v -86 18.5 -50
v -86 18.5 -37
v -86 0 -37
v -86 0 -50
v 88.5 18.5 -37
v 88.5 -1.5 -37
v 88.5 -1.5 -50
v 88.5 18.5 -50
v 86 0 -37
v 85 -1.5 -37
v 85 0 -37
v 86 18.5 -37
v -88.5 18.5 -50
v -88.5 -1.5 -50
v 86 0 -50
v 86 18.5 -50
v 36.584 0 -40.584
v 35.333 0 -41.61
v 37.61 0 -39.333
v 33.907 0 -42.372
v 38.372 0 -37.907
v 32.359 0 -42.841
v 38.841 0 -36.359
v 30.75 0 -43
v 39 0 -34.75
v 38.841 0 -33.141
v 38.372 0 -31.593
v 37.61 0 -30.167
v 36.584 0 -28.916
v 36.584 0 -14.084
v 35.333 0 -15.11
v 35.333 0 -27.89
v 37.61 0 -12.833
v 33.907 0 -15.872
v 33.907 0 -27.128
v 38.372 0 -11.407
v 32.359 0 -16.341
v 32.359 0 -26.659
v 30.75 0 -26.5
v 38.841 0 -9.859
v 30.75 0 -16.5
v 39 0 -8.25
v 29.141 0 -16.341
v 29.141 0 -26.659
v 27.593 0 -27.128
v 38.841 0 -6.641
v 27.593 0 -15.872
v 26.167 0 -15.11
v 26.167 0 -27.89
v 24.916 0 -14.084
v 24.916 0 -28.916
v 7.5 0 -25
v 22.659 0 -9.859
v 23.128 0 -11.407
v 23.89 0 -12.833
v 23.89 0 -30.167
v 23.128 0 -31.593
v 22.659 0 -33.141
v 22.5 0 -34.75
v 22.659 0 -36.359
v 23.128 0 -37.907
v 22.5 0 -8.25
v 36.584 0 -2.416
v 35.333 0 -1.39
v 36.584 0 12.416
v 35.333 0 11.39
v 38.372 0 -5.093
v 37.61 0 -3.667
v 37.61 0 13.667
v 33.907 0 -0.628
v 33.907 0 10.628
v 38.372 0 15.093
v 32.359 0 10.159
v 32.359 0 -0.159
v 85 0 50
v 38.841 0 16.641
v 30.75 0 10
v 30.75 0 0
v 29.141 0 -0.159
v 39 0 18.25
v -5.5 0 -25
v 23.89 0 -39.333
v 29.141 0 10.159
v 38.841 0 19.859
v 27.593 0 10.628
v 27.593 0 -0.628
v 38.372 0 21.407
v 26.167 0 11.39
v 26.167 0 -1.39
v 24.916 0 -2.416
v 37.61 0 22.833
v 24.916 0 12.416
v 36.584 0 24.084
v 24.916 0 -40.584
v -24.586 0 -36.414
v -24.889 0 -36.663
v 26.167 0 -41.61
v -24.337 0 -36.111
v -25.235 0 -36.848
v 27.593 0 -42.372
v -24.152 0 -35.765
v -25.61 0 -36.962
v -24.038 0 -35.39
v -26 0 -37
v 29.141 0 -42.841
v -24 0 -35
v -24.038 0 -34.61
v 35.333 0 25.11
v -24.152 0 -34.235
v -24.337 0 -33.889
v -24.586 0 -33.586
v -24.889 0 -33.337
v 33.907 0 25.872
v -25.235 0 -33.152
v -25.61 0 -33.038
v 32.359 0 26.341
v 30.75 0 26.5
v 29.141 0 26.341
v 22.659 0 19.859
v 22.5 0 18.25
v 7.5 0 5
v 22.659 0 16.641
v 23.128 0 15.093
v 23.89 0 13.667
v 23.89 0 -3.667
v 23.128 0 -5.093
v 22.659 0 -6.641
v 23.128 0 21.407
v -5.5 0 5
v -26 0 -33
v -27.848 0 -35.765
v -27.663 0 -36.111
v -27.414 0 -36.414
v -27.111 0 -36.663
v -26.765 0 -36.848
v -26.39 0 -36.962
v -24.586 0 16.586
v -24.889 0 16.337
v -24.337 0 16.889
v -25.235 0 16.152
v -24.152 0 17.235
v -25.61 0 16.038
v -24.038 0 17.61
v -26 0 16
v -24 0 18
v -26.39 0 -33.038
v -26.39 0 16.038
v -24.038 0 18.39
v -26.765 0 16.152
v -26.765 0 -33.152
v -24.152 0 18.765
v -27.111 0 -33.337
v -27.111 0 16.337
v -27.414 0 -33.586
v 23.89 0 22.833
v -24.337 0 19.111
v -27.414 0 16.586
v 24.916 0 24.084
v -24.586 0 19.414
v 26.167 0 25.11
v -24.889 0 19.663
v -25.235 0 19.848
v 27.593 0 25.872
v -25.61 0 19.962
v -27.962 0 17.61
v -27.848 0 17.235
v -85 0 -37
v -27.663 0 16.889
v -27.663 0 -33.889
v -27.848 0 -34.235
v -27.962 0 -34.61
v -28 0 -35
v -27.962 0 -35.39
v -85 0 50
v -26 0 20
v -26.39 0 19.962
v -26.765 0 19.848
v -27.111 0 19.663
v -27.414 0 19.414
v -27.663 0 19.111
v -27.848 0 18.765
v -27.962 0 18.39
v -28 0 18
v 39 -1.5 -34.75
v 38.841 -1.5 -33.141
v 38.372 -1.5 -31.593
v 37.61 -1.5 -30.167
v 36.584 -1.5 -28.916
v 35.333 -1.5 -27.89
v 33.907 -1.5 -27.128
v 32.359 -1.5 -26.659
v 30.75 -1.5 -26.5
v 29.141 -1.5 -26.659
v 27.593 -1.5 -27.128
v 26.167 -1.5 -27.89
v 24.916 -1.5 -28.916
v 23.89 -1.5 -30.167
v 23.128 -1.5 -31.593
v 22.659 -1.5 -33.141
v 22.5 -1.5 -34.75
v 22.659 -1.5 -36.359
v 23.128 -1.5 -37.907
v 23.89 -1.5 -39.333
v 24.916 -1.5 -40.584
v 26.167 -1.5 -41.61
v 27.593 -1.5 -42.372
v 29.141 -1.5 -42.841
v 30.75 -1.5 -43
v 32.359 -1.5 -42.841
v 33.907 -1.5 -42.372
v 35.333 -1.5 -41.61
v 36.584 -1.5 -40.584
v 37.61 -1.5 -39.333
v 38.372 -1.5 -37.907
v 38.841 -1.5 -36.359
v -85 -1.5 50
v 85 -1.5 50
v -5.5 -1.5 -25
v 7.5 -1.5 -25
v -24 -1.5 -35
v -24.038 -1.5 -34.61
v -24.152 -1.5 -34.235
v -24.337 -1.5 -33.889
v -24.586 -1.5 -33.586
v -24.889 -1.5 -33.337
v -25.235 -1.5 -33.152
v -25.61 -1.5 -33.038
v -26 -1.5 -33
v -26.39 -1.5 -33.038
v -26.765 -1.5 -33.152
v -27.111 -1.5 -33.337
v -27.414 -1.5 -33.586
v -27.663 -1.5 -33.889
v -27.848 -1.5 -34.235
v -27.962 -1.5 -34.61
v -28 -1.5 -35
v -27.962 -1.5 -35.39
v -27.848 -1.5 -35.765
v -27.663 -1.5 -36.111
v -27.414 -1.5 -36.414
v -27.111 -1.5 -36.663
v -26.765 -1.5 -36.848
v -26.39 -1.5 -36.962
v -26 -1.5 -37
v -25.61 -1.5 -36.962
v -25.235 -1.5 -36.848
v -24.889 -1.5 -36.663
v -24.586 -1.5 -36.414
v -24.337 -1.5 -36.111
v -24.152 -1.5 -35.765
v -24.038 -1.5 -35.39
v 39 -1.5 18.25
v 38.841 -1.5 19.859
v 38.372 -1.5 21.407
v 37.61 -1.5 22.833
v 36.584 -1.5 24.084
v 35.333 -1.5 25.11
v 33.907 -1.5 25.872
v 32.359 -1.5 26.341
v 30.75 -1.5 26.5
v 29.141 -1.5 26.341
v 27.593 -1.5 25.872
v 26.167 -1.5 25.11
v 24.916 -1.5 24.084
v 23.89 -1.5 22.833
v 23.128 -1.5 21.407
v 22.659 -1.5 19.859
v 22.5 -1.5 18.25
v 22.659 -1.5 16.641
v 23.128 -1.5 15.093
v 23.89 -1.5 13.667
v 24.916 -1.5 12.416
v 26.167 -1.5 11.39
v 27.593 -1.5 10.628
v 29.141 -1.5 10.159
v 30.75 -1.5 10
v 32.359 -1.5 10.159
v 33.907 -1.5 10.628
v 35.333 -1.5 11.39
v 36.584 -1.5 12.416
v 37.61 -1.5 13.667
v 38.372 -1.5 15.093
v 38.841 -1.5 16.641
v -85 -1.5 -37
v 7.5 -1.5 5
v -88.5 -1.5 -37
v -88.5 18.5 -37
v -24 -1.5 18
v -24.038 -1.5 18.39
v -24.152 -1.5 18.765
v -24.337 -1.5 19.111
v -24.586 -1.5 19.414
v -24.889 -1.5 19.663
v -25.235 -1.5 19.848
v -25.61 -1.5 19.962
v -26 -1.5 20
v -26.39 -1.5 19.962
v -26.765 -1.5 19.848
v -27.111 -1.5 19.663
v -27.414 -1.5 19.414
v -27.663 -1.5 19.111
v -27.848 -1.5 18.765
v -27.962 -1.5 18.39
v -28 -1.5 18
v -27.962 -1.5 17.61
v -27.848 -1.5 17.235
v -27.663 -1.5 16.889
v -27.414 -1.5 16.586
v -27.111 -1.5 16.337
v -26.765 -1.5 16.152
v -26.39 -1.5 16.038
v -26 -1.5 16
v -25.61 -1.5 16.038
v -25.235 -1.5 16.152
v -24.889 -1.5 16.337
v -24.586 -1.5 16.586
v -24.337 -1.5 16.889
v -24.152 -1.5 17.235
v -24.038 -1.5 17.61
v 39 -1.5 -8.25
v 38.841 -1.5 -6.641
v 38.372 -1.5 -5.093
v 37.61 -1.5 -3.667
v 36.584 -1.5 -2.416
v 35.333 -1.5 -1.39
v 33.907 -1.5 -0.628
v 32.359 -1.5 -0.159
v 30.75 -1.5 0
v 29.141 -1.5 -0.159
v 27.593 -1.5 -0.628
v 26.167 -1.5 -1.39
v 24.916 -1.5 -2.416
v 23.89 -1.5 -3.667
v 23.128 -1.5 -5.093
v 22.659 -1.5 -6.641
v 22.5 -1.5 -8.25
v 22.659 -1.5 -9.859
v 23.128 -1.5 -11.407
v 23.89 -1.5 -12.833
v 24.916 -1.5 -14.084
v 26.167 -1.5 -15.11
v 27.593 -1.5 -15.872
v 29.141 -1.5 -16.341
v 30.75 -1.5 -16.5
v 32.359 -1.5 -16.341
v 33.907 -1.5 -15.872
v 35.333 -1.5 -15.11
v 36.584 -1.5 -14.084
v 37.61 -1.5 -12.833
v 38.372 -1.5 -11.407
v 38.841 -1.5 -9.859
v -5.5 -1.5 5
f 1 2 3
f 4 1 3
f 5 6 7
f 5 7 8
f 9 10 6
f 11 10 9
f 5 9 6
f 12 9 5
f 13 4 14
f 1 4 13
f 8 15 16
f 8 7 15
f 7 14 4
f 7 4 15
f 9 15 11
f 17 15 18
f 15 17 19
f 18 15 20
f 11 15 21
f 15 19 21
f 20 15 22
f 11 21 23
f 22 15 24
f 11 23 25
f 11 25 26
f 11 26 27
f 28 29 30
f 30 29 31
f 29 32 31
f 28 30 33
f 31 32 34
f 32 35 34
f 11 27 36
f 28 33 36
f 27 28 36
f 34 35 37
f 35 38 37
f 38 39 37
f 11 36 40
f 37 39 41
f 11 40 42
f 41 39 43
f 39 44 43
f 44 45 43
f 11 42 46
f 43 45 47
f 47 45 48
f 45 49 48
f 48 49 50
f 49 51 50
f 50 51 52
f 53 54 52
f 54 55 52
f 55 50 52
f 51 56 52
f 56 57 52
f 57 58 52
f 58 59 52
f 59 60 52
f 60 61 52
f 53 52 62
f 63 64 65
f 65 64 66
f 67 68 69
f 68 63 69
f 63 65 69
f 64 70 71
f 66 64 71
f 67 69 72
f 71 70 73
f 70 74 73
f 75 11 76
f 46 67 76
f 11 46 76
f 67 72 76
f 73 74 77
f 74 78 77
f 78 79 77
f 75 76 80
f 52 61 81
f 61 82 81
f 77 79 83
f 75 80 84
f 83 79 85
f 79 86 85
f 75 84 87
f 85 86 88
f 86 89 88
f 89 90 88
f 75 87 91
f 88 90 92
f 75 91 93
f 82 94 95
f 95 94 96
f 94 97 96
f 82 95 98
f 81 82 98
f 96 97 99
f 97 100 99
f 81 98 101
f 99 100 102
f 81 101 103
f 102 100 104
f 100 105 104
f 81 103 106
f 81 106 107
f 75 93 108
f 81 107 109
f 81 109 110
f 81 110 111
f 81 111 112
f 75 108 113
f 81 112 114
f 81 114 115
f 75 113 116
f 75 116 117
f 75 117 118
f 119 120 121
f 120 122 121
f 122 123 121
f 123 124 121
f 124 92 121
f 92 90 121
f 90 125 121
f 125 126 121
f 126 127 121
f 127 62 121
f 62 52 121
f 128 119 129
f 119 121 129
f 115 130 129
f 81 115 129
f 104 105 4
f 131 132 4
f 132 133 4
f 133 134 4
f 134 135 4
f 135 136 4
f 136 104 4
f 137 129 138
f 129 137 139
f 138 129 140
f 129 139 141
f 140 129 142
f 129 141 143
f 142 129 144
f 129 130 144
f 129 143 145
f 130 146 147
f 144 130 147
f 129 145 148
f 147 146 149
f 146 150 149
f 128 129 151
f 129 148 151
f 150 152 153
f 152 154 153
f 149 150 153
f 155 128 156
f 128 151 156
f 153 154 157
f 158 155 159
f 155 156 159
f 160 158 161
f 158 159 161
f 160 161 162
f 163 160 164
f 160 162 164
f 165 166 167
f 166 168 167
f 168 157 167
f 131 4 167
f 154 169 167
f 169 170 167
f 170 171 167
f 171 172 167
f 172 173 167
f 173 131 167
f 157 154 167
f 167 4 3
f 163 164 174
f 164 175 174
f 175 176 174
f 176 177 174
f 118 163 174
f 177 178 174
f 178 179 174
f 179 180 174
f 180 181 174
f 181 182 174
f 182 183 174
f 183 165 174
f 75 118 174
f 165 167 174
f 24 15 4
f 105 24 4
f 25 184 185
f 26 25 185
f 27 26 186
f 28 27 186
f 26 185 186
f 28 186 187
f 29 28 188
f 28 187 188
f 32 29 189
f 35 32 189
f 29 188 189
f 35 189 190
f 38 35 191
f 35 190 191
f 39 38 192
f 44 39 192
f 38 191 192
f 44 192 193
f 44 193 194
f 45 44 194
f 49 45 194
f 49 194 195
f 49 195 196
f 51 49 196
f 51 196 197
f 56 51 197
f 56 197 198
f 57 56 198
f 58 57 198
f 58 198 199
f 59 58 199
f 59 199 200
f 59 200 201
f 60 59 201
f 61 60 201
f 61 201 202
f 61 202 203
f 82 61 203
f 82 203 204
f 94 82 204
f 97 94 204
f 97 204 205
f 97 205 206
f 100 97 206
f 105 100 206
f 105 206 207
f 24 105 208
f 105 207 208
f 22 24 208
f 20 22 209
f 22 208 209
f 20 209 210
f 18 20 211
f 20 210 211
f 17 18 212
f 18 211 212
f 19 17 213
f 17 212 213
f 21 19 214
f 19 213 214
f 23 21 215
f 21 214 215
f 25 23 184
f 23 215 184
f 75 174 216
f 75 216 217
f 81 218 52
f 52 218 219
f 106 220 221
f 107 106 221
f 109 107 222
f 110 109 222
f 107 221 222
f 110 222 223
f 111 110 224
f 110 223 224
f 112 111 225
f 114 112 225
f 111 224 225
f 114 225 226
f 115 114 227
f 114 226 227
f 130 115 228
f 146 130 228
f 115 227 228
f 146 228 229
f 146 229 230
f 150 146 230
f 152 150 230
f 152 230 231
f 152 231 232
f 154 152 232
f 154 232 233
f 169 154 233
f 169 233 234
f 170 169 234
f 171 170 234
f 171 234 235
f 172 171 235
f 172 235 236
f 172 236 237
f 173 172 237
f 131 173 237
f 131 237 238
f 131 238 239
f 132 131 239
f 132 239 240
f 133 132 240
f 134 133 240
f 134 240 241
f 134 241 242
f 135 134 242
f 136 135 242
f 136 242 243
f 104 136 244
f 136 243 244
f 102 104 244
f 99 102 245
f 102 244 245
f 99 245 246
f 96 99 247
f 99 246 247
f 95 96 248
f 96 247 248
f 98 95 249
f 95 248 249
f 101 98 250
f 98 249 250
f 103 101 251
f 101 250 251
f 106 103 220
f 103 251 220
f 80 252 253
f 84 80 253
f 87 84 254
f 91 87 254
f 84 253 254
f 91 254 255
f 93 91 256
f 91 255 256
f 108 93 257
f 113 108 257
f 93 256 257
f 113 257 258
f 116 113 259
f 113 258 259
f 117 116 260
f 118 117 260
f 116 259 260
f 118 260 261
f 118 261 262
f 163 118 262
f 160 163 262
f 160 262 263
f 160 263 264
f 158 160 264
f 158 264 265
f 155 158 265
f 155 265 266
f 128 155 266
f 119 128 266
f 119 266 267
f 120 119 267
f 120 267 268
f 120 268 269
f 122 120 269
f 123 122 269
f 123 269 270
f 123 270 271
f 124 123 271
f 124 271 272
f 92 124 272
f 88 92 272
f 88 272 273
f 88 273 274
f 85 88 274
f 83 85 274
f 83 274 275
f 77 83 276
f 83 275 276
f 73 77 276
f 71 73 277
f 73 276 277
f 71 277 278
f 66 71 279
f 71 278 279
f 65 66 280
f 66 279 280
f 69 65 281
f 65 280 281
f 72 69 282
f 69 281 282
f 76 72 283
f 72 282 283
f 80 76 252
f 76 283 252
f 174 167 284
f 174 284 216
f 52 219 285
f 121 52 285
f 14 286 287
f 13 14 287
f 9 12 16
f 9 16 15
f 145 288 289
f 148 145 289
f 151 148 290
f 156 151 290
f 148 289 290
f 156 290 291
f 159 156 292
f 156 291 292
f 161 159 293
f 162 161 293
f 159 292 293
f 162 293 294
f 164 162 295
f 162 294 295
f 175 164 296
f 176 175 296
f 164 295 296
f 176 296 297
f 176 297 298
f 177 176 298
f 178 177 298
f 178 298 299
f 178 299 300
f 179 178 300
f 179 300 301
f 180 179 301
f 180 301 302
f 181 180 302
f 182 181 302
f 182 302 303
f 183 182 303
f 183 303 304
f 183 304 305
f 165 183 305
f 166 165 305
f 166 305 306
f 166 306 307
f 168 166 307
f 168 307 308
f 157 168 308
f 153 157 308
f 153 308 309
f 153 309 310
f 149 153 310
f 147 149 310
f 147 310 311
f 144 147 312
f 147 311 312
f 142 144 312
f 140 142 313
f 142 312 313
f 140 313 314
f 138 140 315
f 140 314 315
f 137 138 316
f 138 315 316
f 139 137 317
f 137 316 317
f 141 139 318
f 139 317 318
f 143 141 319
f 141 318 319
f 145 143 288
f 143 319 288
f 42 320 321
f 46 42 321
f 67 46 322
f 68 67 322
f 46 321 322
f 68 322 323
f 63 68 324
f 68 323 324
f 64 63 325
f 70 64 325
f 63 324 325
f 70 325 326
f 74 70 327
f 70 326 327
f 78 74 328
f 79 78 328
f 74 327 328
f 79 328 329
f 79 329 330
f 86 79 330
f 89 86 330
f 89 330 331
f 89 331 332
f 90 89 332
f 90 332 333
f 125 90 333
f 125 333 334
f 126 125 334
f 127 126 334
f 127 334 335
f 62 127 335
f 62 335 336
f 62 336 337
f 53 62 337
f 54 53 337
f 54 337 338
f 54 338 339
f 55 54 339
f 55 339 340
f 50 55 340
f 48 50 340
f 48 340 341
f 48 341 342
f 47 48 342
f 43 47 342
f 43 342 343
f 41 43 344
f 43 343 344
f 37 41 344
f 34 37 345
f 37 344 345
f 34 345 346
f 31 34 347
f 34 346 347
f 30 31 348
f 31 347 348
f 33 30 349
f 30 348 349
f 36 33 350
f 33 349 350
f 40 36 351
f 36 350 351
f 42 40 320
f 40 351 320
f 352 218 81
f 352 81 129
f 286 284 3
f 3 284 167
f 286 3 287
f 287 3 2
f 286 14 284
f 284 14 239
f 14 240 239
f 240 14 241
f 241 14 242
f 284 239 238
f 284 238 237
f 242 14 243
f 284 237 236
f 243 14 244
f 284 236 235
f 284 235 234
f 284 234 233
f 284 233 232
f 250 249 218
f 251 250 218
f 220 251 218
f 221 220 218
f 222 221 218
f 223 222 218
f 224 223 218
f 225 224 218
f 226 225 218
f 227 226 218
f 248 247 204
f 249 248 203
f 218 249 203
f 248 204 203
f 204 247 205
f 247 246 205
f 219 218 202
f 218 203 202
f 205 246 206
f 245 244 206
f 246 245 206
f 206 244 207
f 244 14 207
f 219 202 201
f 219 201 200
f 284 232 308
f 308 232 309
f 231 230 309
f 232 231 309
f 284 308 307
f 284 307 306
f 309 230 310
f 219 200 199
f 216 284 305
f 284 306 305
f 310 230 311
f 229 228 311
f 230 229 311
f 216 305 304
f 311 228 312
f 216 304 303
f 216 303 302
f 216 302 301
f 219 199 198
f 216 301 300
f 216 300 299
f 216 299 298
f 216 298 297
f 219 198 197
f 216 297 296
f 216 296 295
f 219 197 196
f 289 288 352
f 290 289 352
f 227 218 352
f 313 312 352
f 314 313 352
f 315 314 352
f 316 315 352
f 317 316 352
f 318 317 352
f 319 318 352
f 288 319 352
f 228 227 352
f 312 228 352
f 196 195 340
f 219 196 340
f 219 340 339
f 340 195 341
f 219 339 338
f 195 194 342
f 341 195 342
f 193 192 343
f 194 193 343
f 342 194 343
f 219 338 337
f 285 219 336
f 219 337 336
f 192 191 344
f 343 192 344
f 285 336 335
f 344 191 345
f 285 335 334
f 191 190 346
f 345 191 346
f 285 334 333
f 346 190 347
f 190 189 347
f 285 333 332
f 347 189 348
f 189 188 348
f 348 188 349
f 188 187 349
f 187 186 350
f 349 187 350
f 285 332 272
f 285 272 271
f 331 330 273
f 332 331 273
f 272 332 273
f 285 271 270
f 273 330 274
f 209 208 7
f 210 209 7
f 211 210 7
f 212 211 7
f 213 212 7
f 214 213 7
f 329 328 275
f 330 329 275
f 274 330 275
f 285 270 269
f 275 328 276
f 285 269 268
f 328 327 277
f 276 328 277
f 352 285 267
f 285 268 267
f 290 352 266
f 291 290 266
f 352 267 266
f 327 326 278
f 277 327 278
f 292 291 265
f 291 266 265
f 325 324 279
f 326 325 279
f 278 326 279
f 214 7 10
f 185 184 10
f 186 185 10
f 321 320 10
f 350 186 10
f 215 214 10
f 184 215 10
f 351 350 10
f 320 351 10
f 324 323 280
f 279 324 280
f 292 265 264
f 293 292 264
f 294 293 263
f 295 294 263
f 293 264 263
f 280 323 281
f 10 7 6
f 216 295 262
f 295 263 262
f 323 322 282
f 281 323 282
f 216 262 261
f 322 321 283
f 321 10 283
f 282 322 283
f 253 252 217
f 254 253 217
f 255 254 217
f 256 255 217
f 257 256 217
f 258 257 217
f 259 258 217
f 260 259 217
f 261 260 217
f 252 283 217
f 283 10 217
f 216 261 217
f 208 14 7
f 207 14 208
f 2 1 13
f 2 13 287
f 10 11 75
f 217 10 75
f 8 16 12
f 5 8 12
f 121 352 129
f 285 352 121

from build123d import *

# Parameters (mm, degrees)
F0_W     = 170
F0_H     = 100
F1_DEPTH = 1.5
F2_R     = 8.25
F2_W     = 13
F2_H     = 30
F2_R_2   = 2
F3_DEPTH = 25
F4_W     = 20
F4_H     = 13
F5_DEPTH = 3.5
F6_W     = 18.5
F6_H     = 13
F7_DEPTH = 1


# Not quite as in the source:
# - a pattern or mirror of a feature is missing from the dataset's text; its kind, count and spacing are read off the source's solid


with BuildPart() as f1:
    # F0 (on Front) → F1 (new body)
    with BuildSketch(Plane.XZ):
        Rectangle(F0_W, F0_H)
    extrude(amount=F1_DEPTH)

    # F2 (on face) → F3 (cut)
    with BuildSketch(Plane.XZ.offset(1.5)):
        with Locations((30.75, -34.75)):
            Circle(F2_R)
        with Locations((30.75, -8.25)):
            Circle(F2_R)
        with Locations((30.75, 18.25)):
            Circle(F2_R)
        with Locations((1, -10)):
            Rectangle(F2_W, F2_H)
        with Locations((-26, -35)):
            Circle(F2_R_2)
        with Locations((-26, 18)):
            Circle(F2_R_2)
    extrude(amount=-F3_DEPTH, mode=Mode.SUBTRACT)

    # F4 (on face) → F5 (join)
    with BuildSketch(Plane.YZ.offset(85)):
        with Locations((8.5, -43.5)):
            Rectangle(F4_W, F4_H)
    f5 = extrude(amount=F5_DEPTH)

    # F5_copies: F5 across plane
    add(f5.mirror(Plane(origin=(0, 0, 0), x_dir=(0, 0, -1), z_dir=(-1, 0, 0))))

    # F6 (on face) → F7 (cut)
    with BuildSketch(Plane(origin=(85, 0, 0), x_dir=(0, -1, 0), z_dir=(-1, 0, 0))):
        with Locations((-9.25, -43.5)):
            Rectangle(F6_W, F6_H)
    f7 = extrude(amount=-F7_DEPTH, mode=Mode.SUBTRACT)

    # F7_copies: F7 across plane
    add(f7.mirror(Plane(origin=(0, 0, 0), x_dir=(0, 0, -1), z_dir=(-1, 0, 0))), mode=Mode.SUBTRACT)


solid = f1.part
